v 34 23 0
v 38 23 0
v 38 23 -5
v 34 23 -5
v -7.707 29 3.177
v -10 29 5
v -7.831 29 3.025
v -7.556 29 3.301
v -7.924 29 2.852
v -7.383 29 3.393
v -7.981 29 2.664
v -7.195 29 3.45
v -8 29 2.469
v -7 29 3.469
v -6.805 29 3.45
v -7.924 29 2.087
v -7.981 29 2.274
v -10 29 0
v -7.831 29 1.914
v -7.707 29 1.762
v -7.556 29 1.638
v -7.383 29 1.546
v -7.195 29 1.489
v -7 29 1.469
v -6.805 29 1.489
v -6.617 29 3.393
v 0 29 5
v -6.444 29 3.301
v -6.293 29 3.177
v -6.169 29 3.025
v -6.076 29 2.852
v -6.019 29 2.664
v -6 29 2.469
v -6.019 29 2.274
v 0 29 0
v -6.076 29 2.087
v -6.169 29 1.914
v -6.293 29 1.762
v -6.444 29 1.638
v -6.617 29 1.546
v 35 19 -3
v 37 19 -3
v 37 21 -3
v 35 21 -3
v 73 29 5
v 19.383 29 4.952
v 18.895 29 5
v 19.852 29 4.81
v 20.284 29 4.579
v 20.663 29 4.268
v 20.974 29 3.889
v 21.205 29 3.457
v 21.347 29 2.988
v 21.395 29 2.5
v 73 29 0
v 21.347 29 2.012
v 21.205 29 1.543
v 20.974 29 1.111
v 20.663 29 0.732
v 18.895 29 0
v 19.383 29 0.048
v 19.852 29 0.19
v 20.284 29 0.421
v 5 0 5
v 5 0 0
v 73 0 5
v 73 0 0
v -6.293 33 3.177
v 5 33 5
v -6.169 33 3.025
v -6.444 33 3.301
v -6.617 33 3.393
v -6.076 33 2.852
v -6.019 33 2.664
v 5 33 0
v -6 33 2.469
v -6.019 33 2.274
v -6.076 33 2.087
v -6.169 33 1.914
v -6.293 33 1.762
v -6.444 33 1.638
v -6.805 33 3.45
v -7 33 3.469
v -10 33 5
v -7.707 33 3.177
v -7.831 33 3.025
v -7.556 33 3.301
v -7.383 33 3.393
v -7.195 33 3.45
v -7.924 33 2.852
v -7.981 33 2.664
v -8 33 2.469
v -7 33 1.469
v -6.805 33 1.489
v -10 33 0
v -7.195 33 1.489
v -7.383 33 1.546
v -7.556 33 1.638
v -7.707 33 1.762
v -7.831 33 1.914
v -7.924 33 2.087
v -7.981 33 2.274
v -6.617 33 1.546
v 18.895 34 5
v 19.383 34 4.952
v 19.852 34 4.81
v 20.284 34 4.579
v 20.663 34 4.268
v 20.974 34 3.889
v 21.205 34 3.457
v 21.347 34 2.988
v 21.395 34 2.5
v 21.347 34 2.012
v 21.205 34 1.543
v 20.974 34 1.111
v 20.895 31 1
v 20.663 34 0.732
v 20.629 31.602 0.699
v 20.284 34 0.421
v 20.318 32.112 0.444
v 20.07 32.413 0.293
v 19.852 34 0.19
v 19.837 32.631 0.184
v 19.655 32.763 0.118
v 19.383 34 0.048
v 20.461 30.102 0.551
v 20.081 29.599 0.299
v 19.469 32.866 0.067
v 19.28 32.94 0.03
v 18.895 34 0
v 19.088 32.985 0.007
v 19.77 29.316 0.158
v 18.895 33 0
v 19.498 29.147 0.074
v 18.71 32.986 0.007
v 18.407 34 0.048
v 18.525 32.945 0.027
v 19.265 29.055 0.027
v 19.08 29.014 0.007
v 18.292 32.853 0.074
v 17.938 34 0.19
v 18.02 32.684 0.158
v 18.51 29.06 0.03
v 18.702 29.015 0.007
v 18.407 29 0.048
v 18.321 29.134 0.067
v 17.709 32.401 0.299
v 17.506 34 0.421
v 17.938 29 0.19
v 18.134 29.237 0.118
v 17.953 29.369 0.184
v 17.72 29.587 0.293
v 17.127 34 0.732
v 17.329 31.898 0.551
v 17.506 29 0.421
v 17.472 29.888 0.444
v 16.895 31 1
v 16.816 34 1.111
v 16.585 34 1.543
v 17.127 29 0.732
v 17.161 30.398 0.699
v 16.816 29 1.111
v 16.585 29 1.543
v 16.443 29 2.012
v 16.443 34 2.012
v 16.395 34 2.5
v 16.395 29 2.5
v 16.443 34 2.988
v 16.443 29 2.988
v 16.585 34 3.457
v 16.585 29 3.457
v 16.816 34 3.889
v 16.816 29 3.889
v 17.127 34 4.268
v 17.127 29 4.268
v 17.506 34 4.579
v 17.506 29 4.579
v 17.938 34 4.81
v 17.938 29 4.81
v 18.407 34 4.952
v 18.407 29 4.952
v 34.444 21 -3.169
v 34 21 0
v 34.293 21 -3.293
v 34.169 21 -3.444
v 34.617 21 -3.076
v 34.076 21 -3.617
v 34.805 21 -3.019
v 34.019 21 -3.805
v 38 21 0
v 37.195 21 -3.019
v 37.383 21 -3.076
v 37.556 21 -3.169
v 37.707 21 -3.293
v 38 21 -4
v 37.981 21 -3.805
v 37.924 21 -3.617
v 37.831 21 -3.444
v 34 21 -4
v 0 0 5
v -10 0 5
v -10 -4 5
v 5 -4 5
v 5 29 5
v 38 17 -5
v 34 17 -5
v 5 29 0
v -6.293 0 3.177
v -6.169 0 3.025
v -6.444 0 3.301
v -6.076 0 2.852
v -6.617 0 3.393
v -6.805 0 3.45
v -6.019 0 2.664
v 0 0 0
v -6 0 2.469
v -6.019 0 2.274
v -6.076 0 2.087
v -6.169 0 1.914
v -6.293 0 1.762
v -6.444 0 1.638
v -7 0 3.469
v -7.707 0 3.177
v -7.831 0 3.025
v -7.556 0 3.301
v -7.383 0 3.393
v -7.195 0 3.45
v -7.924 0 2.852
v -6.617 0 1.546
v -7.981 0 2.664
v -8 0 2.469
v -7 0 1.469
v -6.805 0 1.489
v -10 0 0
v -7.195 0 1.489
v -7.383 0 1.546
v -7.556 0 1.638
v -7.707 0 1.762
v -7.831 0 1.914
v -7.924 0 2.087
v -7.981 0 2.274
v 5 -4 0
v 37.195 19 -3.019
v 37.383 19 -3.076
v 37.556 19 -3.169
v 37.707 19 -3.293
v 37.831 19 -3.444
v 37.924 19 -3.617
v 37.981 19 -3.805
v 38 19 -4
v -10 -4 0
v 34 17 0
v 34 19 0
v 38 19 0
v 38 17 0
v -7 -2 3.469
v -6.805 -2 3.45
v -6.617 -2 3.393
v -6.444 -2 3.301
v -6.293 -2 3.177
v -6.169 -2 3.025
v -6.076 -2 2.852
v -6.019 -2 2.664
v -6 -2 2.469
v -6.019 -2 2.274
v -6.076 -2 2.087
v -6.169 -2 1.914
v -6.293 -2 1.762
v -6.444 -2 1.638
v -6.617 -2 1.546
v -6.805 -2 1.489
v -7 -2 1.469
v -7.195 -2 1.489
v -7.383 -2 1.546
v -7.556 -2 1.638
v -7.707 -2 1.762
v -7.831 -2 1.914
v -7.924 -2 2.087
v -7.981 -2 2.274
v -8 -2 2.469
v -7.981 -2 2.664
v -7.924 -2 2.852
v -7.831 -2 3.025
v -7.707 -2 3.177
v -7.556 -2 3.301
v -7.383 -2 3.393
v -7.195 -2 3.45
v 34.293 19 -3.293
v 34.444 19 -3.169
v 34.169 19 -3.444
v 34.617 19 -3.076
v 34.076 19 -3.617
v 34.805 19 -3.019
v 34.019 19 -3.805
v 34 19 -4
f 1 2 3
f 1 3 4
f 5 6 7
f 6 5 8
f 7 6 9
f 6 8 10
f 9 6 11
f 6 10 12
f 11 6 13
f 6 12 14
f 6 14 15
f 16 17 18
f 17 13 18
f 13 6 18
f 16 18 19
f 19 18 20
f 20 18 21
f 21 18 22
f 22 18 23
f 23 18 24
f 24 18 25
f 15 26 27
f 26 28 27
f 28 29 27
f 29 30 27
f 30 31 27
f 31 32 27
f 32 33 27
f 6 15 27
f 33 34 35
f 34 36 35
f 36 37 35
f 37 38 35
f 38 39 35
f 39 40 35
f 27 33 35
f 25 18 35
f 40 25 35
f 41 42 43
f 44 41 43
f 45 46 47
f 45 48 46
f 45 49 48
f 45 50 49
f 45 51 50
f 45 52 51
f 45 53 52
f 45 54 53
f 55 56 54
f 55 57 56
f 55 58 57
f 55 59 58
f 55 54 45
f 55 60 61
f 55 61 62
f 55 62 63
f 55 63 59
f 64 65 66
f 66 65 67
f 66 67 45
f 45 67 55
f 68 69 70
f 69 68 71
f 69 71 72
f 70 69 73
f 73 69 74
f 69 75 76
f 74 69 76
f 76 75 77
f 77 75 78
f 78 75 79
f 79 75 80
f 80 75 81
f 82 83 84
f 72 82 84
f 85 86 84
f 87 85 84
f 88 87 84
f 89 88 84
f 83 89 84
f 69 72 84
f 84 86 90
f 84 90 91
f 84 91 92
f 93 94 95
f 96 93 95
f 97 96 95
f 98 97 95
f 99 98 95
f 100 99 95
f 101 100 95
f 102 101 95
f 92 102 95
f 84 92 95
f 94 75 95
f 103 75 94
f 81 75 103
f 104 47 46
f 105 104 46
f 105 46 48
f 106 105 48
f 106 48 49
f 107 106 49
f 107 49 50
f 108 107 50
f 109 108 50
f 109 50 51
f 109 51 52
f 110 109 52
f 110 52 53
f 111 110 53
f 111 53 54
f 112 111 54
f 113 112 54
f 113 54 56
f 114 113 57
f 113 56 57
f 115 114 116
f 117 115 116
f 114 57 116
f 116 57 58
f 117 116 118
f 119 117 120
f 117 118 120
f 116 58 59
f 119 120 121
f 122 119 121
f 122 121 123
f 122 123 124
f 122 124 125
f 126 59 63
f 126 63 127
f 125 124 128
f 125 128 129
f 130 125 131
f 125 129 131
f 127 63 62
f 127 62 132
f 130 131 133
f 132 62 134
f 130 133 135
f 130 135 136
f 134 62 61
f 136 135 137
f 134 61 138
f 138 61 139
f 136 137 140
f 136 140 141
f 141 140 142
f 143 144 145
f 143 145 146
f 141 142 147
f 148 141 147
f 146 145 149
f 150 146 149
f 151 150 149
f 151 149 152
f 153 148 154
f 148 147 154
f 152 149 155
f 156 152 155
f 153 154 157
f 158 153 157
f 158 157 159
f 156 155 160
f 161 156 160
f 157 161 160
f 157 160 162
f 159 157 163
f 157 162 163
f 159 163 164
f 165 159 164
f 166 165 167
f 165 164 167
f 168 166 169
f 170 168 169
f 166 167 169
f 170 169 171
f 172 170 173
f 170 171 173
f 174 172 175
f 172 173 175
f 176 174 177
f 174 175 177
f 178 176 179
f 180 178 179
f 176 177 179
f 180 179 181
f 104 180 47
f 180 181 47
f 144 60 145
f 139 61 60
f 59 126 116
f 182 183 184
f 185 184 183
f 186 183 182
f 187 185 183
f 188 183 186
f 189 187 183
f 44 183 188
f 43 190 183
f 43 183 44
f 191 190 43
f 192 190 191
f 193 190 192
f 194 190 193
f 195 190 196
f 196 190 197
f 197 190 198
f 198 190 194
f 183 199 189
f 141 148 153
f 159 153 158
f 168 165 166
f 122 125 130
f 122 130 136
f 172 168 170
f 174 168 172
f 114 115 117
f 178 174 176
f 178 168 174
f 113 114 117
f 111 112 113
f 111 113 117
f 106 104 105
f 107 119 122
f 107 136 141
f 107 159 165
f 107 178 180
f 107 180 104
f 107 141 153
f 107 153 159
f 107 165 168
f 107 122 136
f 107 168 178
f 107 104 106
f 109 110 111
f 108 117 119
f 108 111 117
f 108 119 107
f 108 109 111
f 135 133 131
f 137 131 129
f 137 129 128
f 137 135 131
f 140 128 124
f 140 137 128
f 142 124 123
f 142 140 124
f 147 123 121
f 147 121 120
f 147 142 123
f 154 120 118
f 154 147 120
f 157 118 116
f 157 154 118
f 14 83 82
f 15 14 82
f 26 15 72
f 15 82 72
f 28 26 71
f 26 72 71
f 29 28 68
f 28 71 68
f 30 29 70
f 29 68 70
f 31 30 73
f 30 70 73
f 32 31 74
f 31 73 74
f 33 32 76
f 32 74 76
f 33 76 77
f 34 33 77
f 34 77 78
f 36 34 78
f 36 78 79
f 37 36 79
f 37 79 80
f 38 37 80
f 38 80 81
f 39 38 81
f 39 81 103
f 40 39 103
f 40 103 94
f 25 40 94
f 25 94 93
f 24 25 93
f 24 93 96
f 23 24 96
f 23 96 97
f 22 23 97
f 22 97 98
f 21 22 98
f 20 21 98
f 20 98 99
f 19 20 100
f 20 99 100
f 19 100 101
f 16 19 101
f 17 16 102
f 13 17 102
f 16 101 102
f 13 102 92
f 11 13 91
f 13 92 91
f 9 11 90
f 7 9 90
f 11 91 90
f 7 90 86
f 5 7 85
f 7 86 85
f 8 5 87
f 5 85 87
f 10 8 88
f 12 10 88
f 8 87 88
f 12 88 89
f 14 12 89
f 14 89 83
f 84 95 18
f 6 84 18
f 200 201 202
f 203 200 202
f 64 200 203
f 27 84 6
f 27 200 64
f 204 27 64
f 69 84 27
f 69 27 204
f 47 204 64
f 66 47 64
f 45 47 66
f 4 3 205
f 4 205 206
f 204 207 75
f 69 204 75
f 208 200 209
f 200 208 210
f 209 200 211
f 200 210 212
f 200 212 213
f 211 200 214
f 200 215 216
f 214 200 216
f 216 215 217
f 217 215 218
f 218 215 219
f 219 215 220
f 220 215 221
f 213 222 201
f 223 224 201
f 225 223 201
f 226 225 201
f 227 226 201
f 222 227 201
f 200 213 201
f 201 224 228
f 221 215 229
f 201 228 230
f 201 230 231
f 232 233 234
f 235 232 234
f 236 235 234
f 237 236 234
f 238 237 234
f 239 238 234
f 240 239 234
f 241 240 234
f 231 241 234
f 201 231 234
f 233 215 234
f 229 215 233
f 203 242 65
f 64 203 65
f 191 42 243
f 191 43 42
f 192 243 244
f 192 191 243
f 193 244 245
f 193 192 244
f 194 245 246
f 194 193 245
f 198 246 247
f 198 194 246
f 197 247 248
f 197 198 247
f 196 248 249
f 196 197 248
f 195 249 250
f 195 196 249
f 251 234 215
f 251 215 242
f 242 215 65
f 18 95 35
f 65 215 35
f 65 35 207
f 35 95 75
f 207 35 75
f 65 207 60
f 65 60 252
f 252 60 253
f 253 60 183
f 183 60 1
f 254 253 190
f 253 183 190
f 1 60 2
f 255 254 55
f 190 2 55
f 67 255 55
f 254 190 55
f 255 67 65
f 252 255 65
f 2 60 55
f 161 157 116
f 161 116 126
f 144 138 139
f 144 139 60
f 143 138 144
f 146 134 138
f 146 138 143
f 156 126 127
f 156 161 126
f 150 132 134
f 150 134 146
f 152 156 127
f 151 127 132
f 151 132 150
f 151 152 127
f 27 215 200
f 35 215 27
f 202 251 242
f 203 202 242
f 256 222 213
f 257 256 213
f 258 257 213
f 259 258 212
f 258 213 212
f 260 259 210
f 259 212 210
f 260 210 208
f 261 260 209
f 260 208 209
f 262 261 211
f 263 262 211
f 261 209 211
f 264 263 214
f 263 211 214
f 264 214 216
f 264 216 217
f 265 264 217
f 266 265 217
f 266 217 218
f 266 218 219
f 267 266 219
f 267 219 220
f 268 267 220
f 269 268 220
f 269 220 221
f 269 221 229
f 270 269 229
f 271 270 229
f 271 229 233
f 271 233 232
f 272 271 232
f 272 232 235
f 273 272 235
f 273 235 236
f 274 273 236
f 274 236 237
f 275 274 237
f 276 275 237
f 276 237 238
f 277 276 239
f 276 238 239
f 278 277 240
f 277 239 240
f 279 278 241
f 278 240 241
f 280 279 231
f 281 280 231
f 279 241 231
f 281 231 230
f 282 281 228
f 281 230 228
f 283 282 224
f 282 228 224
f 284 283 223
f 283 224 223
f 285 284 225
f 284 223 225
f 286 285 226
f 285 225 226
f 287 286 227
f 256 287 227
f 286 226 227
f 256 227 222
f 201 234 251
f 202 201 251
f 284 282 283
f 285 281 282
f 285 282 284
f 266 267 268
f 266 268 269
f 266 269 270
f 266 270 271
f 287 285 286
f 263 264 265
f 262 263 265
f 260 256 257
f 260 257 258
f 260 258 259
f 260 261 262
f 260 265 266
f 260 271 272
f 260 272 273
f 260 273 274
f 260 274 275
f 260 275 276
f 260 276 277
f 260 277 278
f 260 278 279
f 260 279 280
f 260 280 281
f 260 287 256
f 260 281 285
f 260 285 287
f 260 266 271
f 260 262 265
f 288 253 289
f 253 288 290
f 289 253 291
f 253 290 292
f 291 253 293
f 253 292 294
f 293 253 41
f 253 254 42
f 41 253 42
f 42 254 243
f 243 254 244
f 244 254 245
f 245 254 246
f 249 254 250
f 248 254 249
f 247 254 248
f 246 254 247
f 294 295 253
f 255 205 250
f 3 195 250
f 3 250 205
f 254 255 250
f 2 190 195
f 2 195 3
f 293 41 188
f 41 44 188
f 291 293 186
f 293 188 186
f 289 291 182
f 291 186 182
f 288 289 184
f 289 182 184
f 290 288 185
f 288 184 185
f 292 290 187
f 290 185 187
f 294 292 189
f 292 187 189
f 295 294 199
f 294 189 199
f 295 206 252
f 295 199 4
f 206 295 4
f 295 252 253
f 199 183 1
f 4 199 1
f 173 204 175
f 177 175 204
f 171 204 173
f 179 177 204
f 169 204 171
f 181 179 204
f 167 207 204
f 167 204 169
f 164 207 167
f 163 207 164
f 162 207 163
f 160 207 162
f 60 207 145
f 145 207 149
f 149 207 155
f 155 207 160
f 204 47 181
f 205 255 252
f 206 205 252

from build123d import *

# Parameters (mm, degrees)
SKETCH1_W           = 73
SKETCH1_H           = 29
BOSS_EXTRUDE1_DEPTH = 5
SKETCH2_R           = 1
CUT_EXTRUDE1_DEPTH  = 35
SKETCH3_W           = 4
SKETCH3_H           = 6
BOSS_EXTRUDE2_DEPTH = 5
SKETCH4_W           = 3
SKETCH4_H           = 2
CUT_EXTRUDE2_DEPTH  = 10
SKETCH5_R           = 2.5
BOSS_EXTRUDE3_DEPTH = 5
CUT_EXTRUDE3_DEPTH  = 25
FILLET1_R           = 1


with BuildPart() as part:
    # Sketch1 → Boss-Extrude1 (new body)
    with BuildSketch(Plane.XY):
        with Locations((36.5, 14.5)):
            Rectangle(SKETCH1_W, SKETCH1_H)
        Polygon((-10, 29), (0, 29), (5, 29), (5, 33), (-10, 33), align=None)
        Polygon((5, 0), (0, 0), (-10, 0), (-10, -4), (5, -4), align=None)
    extrude(amount=BOSS_EXTRUDE1_DEPTH)

    # Sketch2 → Cut-Extrude1 (cut)
    with BuildSketch(Plane(origin=(0, 33, 0), x_dir=(1, 0, 0), z_dir=(0, 1, 0))):
        with Locations(Location((-7, -2.46940408, 0), (0, 0, 270))):
            Circle(SKETCH2_R)
    extrude(amount=-CUT_EXTRUDE1_DEPTH, mode=Mode.SUBTRACT)

    # Sketch3 → Boss-Extrude2 (add)
    with BuildSketch(Plane(origin=(0, 0, 0), x_dir=(-1, 0, 0), z_dir=(0, 0, -1))):
        with Locations((-36, 20)):
            Rectangle(SKETCH3_W, SKETCH3_H)
    extrude(amount=BOSS_EXTRUDE2_DEPTH)

    # Sketch4 → Cut-Extrude2 (cut)
    with BuildSketch(Plane(origin=(38, 0, 0), x_dir=(0, 0, -1), z_dir=(1, 0, 0))):
        with Locations((1.5, 20)):
            Rectangle(SKETCH4_W, SKETCH4_H)
    extrude(amount=-CUT_EXTRUDE2_DEPTH, mode=Mode.SUBTRACT)

    # Sketch5 → Boss-Extrude3 (add)
    with BuildSketch(Plane(origin=(0, 29, 0), x_dir=(1, 0, 0), z_dir=(0, 1, 0))):
        with Locations(Location((18.894998898, -2.5, 0), (0, 0, 270))):
            Circle(SKETCH5_R)
    extrude(amount=BOSS_EXTRUDE3_DEPTH)

    # Sketch6 → Cut-Extrude3 (cut)
    with BuildSketch(Plane(origin=(5, 0, 0), x_dir=(0, 0, -1), z_dir=(1, 0, 0))):
        Polygon((0, 33), (-1, 31), (0, 29), align=None)
    extrude(amount=CUT_EXTRUDE3_DEPTH, mode=Mode.SUBTRACT)

    # Fillet1
    fillet1_edges = [part.edges().sort_by_distance(p)[0] for p in [
        (34, 20, -3),
        (38, 20, -3),
    ]]
    fillet(fillet1_edges, radius=FILLET1_R)


solid = part.part
